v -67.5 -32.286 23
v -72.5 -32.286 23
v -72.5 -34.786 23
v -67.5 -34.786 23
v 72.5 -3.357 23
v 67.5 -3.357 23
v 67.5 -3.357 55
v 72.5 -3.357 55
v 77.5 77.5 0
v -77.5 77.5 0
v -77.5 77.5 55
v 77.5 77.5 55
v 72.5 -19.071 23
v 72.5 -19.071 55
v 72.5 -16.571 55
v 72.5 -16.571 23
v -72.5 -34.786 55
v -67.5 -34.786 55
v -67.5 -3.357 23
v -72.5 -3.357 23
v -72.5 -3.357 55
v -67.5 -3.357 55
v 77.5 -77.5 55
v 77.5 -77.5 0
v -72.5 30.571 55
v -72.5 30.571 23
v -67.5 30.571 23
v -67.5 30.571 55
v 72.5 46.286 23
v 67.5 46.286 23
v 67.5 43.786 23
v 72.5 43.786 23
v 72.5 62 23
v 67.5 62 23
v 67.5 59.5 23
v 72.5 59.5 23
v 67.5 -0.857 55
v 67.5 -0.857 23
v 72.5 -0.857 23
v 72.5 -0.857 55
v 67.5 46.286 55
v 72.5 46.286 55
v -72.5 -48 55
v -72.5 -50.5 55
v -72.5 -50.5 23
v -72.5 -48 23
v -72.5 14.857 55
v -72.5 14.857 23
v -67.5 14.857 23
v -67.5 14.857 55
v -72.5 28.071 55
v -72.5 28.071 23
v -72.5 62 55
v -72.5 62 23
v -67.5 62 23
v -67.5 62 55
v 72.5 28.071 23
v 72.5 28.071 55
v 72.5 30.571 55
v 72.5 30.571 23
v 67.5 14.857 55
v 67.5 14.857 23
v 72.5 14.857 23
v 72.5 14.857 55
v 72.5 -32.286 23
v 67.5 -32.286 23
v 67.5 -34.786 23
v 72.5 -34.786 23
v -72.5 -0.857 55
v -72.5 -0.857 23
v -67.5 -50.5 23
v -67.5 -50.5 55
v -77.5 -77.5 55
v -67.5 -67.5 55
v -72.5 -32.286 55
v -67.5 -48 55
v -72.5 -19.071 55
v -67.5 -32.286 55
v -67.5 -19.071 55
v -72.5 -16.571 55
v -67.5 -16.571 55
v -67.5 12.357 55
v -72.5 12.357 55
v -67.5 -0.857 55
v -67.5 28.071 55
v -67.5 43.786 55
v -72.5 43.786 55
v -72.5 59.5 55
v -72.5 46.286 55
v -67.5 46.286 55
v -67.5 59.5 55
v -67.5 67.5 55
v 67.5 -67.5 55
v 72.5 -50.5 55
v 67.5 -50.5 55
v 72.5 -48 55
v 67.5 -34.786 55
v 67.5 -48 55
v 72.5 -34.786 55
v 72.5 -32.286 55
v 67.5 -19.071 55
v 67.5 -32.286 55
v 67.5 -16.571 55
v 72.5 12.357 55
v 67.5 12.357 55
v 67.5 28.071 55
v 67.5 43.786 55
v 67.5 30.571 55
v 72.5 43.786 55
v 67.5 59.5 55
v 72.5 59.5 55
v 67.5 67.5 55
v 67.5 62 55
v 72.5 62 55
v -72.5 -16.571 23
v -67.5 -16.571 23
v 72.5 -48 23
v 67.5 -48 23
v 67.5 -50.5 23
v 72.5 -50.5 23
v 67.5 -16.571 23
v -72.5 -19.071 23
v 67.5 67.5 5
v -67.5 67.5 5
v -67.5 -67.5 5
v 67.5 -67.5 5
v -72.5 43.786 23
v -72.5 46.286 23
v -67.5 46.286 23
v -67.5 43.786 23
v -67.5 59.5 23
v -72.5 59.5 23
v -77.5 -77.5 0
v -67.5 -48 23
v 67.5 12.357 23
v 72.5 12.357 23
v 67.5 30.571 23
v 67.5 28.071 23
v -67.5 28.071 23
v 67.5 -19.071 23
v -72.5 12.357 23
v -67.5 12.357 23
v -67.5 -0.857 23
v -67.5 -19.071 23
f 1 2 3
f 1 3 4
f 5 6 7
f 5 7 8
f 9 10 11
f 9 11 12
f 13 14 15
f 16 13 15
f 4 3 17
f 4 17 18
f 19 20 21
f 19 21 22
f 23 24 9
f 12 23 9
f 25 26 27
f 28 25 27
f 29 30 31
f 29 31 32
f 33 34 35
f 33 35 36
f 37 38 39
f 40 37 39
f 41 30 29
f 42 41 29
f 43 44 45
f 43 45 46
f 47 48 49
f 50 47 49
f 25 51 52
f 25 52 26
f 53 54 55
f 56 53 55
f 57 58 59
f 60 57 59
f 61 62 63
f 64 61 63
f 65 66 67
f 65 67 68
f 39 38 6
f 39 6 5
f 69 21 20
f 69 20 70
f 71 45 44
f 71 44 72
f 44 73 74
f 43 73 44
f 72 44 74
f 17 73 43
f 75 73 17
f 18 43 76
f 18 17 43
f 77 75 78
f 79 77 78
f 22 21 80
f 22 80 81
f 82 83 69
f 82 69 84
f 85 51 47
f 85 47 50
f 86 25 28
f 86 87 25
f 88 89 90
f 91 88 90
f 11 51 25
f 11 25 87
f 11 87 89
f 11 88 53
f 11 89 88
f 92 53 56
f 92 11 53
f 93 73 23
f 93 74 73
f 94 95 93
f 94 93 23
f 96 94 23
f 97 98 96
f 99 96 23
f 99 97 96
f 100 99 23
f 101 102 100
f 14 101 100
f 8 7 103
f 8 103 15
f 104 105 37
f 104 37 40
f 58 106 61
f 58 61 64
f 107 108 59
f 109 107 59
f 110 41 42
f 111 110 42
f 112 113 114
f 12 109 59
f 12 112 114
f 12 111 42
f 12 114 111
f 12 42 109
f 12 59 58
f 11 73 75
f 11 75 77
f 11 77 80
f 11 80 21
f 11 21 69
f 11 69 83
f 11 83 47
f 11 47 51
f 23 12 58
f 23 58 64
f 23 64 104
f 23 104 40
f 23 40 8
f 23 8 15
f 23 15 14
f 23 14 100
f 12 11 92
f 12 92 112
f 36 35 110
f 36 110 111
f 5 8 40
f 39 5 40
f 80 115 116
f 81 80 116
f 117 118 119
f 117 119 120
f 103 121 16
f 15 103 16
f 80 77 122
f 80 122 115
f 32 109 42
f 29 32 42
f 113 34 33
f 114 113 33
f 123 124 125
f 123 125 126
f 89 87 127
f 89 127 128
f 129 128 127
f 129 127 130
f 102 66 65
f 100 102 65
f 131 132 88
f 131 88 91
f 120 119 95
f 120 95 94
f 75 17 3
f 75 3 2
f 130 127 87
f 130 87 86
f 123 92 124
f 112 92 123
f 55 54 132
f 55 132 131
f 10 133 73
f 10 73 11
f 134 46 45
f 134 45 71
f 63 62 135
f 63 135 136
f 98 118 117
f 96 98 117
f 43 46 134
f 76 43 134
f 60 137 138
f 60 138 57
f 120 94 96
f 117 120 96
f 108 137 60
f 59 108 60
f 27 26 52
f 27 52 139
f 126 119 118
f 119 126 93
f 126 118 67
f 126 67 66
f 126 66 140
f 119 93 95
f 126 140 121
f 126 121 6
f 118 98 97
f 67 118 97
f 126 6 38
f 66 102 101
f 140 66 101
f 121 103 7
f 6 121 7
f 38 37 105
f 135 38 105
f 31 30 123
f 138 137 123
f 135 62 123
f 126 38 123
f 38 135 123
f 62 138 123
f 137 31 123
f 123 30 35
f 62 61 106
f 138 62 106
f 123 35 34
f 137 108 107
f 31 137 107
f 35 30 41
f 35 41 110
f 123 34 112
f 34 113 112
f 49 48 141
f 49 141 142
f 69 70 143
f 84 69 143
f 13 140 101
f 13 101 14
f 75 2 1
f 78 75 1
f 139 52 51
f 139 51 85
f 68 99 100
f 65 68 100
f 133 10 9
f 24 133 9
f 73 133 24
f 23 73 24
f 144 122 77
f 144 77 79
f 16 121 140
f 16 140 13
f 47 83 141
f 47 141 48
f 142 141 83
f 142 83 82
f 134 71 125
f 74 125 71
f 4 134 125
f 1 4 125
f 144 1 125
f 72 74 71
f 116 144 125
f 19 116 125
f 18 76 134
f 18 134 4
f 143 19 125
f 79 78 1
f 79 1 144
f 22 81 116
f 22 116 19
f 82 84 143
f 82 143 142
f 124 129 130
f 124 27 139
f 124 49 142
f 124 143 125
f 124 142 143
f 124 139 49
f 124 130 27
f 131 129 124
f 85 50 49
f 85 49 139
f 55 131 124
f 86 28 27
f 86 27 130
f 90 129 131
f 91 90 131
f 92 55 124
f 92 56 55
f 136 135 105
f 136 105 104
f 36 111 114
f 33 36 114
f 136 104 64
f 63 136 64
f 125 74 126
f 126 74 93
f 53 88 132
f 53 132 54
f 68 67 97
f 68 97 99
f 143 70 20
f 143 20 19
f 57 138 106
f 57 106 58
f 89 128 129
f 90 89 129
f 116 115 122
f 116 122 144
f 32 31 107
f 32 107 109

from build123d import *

# Parameters (mm, degrees)
SKETCH_W            = 155
SKETCH_H            = 155
PAD_DEPTH           = 55
SKETCH001_W         = 135
SKETCH001_H         = 135
POCKET_DEPTH        = 110
SKETCH002_W         = 145
SKETCH002_H         = 2.5
POCKET001_DEPTH     = 92
LINEARPATTERN_COUNT = 8
LINEARPATTERN_PITCH = 15.714286


with BuildPart() as part:
    # Sketch → Pad (new body)
    with BuildSketch(Plane.XY):
        Rectangle(SKETCH_W, SKETCH_H)
    extrude(amount=PAD_DEPTH)

    # Sketch001 → Pocket (cut)
    with BuildSketch(Plane.XY.offset(115)):
        Rectangle(SKETCH001_W, SKETCH001_H)
    extrude(amount=-POCKET_DEPTH, mode=Mode.SUBTRACT)

    # Sketch002 → Pocket001 (cut)
    with BuildSketch(Plane.XY.offset(115)):
        with Locations((0, 60.75)):
            Rectangle(SKETCH002_W, SKETCH002_H)
    pocket001 = extrude(amount=-POCKET001_DEPTH, mode=Mode.SUBTRACT)

    # LinearPattern: Pocket001 ×8
    with Locations(*[(0, -i * LINEARPATTERN_PITCH, 0) for i in range(1, LINEARPATTERN_COUNT)]):
        add(pocket001, mode=Mode.SUBTRACT)


solid = part.part
